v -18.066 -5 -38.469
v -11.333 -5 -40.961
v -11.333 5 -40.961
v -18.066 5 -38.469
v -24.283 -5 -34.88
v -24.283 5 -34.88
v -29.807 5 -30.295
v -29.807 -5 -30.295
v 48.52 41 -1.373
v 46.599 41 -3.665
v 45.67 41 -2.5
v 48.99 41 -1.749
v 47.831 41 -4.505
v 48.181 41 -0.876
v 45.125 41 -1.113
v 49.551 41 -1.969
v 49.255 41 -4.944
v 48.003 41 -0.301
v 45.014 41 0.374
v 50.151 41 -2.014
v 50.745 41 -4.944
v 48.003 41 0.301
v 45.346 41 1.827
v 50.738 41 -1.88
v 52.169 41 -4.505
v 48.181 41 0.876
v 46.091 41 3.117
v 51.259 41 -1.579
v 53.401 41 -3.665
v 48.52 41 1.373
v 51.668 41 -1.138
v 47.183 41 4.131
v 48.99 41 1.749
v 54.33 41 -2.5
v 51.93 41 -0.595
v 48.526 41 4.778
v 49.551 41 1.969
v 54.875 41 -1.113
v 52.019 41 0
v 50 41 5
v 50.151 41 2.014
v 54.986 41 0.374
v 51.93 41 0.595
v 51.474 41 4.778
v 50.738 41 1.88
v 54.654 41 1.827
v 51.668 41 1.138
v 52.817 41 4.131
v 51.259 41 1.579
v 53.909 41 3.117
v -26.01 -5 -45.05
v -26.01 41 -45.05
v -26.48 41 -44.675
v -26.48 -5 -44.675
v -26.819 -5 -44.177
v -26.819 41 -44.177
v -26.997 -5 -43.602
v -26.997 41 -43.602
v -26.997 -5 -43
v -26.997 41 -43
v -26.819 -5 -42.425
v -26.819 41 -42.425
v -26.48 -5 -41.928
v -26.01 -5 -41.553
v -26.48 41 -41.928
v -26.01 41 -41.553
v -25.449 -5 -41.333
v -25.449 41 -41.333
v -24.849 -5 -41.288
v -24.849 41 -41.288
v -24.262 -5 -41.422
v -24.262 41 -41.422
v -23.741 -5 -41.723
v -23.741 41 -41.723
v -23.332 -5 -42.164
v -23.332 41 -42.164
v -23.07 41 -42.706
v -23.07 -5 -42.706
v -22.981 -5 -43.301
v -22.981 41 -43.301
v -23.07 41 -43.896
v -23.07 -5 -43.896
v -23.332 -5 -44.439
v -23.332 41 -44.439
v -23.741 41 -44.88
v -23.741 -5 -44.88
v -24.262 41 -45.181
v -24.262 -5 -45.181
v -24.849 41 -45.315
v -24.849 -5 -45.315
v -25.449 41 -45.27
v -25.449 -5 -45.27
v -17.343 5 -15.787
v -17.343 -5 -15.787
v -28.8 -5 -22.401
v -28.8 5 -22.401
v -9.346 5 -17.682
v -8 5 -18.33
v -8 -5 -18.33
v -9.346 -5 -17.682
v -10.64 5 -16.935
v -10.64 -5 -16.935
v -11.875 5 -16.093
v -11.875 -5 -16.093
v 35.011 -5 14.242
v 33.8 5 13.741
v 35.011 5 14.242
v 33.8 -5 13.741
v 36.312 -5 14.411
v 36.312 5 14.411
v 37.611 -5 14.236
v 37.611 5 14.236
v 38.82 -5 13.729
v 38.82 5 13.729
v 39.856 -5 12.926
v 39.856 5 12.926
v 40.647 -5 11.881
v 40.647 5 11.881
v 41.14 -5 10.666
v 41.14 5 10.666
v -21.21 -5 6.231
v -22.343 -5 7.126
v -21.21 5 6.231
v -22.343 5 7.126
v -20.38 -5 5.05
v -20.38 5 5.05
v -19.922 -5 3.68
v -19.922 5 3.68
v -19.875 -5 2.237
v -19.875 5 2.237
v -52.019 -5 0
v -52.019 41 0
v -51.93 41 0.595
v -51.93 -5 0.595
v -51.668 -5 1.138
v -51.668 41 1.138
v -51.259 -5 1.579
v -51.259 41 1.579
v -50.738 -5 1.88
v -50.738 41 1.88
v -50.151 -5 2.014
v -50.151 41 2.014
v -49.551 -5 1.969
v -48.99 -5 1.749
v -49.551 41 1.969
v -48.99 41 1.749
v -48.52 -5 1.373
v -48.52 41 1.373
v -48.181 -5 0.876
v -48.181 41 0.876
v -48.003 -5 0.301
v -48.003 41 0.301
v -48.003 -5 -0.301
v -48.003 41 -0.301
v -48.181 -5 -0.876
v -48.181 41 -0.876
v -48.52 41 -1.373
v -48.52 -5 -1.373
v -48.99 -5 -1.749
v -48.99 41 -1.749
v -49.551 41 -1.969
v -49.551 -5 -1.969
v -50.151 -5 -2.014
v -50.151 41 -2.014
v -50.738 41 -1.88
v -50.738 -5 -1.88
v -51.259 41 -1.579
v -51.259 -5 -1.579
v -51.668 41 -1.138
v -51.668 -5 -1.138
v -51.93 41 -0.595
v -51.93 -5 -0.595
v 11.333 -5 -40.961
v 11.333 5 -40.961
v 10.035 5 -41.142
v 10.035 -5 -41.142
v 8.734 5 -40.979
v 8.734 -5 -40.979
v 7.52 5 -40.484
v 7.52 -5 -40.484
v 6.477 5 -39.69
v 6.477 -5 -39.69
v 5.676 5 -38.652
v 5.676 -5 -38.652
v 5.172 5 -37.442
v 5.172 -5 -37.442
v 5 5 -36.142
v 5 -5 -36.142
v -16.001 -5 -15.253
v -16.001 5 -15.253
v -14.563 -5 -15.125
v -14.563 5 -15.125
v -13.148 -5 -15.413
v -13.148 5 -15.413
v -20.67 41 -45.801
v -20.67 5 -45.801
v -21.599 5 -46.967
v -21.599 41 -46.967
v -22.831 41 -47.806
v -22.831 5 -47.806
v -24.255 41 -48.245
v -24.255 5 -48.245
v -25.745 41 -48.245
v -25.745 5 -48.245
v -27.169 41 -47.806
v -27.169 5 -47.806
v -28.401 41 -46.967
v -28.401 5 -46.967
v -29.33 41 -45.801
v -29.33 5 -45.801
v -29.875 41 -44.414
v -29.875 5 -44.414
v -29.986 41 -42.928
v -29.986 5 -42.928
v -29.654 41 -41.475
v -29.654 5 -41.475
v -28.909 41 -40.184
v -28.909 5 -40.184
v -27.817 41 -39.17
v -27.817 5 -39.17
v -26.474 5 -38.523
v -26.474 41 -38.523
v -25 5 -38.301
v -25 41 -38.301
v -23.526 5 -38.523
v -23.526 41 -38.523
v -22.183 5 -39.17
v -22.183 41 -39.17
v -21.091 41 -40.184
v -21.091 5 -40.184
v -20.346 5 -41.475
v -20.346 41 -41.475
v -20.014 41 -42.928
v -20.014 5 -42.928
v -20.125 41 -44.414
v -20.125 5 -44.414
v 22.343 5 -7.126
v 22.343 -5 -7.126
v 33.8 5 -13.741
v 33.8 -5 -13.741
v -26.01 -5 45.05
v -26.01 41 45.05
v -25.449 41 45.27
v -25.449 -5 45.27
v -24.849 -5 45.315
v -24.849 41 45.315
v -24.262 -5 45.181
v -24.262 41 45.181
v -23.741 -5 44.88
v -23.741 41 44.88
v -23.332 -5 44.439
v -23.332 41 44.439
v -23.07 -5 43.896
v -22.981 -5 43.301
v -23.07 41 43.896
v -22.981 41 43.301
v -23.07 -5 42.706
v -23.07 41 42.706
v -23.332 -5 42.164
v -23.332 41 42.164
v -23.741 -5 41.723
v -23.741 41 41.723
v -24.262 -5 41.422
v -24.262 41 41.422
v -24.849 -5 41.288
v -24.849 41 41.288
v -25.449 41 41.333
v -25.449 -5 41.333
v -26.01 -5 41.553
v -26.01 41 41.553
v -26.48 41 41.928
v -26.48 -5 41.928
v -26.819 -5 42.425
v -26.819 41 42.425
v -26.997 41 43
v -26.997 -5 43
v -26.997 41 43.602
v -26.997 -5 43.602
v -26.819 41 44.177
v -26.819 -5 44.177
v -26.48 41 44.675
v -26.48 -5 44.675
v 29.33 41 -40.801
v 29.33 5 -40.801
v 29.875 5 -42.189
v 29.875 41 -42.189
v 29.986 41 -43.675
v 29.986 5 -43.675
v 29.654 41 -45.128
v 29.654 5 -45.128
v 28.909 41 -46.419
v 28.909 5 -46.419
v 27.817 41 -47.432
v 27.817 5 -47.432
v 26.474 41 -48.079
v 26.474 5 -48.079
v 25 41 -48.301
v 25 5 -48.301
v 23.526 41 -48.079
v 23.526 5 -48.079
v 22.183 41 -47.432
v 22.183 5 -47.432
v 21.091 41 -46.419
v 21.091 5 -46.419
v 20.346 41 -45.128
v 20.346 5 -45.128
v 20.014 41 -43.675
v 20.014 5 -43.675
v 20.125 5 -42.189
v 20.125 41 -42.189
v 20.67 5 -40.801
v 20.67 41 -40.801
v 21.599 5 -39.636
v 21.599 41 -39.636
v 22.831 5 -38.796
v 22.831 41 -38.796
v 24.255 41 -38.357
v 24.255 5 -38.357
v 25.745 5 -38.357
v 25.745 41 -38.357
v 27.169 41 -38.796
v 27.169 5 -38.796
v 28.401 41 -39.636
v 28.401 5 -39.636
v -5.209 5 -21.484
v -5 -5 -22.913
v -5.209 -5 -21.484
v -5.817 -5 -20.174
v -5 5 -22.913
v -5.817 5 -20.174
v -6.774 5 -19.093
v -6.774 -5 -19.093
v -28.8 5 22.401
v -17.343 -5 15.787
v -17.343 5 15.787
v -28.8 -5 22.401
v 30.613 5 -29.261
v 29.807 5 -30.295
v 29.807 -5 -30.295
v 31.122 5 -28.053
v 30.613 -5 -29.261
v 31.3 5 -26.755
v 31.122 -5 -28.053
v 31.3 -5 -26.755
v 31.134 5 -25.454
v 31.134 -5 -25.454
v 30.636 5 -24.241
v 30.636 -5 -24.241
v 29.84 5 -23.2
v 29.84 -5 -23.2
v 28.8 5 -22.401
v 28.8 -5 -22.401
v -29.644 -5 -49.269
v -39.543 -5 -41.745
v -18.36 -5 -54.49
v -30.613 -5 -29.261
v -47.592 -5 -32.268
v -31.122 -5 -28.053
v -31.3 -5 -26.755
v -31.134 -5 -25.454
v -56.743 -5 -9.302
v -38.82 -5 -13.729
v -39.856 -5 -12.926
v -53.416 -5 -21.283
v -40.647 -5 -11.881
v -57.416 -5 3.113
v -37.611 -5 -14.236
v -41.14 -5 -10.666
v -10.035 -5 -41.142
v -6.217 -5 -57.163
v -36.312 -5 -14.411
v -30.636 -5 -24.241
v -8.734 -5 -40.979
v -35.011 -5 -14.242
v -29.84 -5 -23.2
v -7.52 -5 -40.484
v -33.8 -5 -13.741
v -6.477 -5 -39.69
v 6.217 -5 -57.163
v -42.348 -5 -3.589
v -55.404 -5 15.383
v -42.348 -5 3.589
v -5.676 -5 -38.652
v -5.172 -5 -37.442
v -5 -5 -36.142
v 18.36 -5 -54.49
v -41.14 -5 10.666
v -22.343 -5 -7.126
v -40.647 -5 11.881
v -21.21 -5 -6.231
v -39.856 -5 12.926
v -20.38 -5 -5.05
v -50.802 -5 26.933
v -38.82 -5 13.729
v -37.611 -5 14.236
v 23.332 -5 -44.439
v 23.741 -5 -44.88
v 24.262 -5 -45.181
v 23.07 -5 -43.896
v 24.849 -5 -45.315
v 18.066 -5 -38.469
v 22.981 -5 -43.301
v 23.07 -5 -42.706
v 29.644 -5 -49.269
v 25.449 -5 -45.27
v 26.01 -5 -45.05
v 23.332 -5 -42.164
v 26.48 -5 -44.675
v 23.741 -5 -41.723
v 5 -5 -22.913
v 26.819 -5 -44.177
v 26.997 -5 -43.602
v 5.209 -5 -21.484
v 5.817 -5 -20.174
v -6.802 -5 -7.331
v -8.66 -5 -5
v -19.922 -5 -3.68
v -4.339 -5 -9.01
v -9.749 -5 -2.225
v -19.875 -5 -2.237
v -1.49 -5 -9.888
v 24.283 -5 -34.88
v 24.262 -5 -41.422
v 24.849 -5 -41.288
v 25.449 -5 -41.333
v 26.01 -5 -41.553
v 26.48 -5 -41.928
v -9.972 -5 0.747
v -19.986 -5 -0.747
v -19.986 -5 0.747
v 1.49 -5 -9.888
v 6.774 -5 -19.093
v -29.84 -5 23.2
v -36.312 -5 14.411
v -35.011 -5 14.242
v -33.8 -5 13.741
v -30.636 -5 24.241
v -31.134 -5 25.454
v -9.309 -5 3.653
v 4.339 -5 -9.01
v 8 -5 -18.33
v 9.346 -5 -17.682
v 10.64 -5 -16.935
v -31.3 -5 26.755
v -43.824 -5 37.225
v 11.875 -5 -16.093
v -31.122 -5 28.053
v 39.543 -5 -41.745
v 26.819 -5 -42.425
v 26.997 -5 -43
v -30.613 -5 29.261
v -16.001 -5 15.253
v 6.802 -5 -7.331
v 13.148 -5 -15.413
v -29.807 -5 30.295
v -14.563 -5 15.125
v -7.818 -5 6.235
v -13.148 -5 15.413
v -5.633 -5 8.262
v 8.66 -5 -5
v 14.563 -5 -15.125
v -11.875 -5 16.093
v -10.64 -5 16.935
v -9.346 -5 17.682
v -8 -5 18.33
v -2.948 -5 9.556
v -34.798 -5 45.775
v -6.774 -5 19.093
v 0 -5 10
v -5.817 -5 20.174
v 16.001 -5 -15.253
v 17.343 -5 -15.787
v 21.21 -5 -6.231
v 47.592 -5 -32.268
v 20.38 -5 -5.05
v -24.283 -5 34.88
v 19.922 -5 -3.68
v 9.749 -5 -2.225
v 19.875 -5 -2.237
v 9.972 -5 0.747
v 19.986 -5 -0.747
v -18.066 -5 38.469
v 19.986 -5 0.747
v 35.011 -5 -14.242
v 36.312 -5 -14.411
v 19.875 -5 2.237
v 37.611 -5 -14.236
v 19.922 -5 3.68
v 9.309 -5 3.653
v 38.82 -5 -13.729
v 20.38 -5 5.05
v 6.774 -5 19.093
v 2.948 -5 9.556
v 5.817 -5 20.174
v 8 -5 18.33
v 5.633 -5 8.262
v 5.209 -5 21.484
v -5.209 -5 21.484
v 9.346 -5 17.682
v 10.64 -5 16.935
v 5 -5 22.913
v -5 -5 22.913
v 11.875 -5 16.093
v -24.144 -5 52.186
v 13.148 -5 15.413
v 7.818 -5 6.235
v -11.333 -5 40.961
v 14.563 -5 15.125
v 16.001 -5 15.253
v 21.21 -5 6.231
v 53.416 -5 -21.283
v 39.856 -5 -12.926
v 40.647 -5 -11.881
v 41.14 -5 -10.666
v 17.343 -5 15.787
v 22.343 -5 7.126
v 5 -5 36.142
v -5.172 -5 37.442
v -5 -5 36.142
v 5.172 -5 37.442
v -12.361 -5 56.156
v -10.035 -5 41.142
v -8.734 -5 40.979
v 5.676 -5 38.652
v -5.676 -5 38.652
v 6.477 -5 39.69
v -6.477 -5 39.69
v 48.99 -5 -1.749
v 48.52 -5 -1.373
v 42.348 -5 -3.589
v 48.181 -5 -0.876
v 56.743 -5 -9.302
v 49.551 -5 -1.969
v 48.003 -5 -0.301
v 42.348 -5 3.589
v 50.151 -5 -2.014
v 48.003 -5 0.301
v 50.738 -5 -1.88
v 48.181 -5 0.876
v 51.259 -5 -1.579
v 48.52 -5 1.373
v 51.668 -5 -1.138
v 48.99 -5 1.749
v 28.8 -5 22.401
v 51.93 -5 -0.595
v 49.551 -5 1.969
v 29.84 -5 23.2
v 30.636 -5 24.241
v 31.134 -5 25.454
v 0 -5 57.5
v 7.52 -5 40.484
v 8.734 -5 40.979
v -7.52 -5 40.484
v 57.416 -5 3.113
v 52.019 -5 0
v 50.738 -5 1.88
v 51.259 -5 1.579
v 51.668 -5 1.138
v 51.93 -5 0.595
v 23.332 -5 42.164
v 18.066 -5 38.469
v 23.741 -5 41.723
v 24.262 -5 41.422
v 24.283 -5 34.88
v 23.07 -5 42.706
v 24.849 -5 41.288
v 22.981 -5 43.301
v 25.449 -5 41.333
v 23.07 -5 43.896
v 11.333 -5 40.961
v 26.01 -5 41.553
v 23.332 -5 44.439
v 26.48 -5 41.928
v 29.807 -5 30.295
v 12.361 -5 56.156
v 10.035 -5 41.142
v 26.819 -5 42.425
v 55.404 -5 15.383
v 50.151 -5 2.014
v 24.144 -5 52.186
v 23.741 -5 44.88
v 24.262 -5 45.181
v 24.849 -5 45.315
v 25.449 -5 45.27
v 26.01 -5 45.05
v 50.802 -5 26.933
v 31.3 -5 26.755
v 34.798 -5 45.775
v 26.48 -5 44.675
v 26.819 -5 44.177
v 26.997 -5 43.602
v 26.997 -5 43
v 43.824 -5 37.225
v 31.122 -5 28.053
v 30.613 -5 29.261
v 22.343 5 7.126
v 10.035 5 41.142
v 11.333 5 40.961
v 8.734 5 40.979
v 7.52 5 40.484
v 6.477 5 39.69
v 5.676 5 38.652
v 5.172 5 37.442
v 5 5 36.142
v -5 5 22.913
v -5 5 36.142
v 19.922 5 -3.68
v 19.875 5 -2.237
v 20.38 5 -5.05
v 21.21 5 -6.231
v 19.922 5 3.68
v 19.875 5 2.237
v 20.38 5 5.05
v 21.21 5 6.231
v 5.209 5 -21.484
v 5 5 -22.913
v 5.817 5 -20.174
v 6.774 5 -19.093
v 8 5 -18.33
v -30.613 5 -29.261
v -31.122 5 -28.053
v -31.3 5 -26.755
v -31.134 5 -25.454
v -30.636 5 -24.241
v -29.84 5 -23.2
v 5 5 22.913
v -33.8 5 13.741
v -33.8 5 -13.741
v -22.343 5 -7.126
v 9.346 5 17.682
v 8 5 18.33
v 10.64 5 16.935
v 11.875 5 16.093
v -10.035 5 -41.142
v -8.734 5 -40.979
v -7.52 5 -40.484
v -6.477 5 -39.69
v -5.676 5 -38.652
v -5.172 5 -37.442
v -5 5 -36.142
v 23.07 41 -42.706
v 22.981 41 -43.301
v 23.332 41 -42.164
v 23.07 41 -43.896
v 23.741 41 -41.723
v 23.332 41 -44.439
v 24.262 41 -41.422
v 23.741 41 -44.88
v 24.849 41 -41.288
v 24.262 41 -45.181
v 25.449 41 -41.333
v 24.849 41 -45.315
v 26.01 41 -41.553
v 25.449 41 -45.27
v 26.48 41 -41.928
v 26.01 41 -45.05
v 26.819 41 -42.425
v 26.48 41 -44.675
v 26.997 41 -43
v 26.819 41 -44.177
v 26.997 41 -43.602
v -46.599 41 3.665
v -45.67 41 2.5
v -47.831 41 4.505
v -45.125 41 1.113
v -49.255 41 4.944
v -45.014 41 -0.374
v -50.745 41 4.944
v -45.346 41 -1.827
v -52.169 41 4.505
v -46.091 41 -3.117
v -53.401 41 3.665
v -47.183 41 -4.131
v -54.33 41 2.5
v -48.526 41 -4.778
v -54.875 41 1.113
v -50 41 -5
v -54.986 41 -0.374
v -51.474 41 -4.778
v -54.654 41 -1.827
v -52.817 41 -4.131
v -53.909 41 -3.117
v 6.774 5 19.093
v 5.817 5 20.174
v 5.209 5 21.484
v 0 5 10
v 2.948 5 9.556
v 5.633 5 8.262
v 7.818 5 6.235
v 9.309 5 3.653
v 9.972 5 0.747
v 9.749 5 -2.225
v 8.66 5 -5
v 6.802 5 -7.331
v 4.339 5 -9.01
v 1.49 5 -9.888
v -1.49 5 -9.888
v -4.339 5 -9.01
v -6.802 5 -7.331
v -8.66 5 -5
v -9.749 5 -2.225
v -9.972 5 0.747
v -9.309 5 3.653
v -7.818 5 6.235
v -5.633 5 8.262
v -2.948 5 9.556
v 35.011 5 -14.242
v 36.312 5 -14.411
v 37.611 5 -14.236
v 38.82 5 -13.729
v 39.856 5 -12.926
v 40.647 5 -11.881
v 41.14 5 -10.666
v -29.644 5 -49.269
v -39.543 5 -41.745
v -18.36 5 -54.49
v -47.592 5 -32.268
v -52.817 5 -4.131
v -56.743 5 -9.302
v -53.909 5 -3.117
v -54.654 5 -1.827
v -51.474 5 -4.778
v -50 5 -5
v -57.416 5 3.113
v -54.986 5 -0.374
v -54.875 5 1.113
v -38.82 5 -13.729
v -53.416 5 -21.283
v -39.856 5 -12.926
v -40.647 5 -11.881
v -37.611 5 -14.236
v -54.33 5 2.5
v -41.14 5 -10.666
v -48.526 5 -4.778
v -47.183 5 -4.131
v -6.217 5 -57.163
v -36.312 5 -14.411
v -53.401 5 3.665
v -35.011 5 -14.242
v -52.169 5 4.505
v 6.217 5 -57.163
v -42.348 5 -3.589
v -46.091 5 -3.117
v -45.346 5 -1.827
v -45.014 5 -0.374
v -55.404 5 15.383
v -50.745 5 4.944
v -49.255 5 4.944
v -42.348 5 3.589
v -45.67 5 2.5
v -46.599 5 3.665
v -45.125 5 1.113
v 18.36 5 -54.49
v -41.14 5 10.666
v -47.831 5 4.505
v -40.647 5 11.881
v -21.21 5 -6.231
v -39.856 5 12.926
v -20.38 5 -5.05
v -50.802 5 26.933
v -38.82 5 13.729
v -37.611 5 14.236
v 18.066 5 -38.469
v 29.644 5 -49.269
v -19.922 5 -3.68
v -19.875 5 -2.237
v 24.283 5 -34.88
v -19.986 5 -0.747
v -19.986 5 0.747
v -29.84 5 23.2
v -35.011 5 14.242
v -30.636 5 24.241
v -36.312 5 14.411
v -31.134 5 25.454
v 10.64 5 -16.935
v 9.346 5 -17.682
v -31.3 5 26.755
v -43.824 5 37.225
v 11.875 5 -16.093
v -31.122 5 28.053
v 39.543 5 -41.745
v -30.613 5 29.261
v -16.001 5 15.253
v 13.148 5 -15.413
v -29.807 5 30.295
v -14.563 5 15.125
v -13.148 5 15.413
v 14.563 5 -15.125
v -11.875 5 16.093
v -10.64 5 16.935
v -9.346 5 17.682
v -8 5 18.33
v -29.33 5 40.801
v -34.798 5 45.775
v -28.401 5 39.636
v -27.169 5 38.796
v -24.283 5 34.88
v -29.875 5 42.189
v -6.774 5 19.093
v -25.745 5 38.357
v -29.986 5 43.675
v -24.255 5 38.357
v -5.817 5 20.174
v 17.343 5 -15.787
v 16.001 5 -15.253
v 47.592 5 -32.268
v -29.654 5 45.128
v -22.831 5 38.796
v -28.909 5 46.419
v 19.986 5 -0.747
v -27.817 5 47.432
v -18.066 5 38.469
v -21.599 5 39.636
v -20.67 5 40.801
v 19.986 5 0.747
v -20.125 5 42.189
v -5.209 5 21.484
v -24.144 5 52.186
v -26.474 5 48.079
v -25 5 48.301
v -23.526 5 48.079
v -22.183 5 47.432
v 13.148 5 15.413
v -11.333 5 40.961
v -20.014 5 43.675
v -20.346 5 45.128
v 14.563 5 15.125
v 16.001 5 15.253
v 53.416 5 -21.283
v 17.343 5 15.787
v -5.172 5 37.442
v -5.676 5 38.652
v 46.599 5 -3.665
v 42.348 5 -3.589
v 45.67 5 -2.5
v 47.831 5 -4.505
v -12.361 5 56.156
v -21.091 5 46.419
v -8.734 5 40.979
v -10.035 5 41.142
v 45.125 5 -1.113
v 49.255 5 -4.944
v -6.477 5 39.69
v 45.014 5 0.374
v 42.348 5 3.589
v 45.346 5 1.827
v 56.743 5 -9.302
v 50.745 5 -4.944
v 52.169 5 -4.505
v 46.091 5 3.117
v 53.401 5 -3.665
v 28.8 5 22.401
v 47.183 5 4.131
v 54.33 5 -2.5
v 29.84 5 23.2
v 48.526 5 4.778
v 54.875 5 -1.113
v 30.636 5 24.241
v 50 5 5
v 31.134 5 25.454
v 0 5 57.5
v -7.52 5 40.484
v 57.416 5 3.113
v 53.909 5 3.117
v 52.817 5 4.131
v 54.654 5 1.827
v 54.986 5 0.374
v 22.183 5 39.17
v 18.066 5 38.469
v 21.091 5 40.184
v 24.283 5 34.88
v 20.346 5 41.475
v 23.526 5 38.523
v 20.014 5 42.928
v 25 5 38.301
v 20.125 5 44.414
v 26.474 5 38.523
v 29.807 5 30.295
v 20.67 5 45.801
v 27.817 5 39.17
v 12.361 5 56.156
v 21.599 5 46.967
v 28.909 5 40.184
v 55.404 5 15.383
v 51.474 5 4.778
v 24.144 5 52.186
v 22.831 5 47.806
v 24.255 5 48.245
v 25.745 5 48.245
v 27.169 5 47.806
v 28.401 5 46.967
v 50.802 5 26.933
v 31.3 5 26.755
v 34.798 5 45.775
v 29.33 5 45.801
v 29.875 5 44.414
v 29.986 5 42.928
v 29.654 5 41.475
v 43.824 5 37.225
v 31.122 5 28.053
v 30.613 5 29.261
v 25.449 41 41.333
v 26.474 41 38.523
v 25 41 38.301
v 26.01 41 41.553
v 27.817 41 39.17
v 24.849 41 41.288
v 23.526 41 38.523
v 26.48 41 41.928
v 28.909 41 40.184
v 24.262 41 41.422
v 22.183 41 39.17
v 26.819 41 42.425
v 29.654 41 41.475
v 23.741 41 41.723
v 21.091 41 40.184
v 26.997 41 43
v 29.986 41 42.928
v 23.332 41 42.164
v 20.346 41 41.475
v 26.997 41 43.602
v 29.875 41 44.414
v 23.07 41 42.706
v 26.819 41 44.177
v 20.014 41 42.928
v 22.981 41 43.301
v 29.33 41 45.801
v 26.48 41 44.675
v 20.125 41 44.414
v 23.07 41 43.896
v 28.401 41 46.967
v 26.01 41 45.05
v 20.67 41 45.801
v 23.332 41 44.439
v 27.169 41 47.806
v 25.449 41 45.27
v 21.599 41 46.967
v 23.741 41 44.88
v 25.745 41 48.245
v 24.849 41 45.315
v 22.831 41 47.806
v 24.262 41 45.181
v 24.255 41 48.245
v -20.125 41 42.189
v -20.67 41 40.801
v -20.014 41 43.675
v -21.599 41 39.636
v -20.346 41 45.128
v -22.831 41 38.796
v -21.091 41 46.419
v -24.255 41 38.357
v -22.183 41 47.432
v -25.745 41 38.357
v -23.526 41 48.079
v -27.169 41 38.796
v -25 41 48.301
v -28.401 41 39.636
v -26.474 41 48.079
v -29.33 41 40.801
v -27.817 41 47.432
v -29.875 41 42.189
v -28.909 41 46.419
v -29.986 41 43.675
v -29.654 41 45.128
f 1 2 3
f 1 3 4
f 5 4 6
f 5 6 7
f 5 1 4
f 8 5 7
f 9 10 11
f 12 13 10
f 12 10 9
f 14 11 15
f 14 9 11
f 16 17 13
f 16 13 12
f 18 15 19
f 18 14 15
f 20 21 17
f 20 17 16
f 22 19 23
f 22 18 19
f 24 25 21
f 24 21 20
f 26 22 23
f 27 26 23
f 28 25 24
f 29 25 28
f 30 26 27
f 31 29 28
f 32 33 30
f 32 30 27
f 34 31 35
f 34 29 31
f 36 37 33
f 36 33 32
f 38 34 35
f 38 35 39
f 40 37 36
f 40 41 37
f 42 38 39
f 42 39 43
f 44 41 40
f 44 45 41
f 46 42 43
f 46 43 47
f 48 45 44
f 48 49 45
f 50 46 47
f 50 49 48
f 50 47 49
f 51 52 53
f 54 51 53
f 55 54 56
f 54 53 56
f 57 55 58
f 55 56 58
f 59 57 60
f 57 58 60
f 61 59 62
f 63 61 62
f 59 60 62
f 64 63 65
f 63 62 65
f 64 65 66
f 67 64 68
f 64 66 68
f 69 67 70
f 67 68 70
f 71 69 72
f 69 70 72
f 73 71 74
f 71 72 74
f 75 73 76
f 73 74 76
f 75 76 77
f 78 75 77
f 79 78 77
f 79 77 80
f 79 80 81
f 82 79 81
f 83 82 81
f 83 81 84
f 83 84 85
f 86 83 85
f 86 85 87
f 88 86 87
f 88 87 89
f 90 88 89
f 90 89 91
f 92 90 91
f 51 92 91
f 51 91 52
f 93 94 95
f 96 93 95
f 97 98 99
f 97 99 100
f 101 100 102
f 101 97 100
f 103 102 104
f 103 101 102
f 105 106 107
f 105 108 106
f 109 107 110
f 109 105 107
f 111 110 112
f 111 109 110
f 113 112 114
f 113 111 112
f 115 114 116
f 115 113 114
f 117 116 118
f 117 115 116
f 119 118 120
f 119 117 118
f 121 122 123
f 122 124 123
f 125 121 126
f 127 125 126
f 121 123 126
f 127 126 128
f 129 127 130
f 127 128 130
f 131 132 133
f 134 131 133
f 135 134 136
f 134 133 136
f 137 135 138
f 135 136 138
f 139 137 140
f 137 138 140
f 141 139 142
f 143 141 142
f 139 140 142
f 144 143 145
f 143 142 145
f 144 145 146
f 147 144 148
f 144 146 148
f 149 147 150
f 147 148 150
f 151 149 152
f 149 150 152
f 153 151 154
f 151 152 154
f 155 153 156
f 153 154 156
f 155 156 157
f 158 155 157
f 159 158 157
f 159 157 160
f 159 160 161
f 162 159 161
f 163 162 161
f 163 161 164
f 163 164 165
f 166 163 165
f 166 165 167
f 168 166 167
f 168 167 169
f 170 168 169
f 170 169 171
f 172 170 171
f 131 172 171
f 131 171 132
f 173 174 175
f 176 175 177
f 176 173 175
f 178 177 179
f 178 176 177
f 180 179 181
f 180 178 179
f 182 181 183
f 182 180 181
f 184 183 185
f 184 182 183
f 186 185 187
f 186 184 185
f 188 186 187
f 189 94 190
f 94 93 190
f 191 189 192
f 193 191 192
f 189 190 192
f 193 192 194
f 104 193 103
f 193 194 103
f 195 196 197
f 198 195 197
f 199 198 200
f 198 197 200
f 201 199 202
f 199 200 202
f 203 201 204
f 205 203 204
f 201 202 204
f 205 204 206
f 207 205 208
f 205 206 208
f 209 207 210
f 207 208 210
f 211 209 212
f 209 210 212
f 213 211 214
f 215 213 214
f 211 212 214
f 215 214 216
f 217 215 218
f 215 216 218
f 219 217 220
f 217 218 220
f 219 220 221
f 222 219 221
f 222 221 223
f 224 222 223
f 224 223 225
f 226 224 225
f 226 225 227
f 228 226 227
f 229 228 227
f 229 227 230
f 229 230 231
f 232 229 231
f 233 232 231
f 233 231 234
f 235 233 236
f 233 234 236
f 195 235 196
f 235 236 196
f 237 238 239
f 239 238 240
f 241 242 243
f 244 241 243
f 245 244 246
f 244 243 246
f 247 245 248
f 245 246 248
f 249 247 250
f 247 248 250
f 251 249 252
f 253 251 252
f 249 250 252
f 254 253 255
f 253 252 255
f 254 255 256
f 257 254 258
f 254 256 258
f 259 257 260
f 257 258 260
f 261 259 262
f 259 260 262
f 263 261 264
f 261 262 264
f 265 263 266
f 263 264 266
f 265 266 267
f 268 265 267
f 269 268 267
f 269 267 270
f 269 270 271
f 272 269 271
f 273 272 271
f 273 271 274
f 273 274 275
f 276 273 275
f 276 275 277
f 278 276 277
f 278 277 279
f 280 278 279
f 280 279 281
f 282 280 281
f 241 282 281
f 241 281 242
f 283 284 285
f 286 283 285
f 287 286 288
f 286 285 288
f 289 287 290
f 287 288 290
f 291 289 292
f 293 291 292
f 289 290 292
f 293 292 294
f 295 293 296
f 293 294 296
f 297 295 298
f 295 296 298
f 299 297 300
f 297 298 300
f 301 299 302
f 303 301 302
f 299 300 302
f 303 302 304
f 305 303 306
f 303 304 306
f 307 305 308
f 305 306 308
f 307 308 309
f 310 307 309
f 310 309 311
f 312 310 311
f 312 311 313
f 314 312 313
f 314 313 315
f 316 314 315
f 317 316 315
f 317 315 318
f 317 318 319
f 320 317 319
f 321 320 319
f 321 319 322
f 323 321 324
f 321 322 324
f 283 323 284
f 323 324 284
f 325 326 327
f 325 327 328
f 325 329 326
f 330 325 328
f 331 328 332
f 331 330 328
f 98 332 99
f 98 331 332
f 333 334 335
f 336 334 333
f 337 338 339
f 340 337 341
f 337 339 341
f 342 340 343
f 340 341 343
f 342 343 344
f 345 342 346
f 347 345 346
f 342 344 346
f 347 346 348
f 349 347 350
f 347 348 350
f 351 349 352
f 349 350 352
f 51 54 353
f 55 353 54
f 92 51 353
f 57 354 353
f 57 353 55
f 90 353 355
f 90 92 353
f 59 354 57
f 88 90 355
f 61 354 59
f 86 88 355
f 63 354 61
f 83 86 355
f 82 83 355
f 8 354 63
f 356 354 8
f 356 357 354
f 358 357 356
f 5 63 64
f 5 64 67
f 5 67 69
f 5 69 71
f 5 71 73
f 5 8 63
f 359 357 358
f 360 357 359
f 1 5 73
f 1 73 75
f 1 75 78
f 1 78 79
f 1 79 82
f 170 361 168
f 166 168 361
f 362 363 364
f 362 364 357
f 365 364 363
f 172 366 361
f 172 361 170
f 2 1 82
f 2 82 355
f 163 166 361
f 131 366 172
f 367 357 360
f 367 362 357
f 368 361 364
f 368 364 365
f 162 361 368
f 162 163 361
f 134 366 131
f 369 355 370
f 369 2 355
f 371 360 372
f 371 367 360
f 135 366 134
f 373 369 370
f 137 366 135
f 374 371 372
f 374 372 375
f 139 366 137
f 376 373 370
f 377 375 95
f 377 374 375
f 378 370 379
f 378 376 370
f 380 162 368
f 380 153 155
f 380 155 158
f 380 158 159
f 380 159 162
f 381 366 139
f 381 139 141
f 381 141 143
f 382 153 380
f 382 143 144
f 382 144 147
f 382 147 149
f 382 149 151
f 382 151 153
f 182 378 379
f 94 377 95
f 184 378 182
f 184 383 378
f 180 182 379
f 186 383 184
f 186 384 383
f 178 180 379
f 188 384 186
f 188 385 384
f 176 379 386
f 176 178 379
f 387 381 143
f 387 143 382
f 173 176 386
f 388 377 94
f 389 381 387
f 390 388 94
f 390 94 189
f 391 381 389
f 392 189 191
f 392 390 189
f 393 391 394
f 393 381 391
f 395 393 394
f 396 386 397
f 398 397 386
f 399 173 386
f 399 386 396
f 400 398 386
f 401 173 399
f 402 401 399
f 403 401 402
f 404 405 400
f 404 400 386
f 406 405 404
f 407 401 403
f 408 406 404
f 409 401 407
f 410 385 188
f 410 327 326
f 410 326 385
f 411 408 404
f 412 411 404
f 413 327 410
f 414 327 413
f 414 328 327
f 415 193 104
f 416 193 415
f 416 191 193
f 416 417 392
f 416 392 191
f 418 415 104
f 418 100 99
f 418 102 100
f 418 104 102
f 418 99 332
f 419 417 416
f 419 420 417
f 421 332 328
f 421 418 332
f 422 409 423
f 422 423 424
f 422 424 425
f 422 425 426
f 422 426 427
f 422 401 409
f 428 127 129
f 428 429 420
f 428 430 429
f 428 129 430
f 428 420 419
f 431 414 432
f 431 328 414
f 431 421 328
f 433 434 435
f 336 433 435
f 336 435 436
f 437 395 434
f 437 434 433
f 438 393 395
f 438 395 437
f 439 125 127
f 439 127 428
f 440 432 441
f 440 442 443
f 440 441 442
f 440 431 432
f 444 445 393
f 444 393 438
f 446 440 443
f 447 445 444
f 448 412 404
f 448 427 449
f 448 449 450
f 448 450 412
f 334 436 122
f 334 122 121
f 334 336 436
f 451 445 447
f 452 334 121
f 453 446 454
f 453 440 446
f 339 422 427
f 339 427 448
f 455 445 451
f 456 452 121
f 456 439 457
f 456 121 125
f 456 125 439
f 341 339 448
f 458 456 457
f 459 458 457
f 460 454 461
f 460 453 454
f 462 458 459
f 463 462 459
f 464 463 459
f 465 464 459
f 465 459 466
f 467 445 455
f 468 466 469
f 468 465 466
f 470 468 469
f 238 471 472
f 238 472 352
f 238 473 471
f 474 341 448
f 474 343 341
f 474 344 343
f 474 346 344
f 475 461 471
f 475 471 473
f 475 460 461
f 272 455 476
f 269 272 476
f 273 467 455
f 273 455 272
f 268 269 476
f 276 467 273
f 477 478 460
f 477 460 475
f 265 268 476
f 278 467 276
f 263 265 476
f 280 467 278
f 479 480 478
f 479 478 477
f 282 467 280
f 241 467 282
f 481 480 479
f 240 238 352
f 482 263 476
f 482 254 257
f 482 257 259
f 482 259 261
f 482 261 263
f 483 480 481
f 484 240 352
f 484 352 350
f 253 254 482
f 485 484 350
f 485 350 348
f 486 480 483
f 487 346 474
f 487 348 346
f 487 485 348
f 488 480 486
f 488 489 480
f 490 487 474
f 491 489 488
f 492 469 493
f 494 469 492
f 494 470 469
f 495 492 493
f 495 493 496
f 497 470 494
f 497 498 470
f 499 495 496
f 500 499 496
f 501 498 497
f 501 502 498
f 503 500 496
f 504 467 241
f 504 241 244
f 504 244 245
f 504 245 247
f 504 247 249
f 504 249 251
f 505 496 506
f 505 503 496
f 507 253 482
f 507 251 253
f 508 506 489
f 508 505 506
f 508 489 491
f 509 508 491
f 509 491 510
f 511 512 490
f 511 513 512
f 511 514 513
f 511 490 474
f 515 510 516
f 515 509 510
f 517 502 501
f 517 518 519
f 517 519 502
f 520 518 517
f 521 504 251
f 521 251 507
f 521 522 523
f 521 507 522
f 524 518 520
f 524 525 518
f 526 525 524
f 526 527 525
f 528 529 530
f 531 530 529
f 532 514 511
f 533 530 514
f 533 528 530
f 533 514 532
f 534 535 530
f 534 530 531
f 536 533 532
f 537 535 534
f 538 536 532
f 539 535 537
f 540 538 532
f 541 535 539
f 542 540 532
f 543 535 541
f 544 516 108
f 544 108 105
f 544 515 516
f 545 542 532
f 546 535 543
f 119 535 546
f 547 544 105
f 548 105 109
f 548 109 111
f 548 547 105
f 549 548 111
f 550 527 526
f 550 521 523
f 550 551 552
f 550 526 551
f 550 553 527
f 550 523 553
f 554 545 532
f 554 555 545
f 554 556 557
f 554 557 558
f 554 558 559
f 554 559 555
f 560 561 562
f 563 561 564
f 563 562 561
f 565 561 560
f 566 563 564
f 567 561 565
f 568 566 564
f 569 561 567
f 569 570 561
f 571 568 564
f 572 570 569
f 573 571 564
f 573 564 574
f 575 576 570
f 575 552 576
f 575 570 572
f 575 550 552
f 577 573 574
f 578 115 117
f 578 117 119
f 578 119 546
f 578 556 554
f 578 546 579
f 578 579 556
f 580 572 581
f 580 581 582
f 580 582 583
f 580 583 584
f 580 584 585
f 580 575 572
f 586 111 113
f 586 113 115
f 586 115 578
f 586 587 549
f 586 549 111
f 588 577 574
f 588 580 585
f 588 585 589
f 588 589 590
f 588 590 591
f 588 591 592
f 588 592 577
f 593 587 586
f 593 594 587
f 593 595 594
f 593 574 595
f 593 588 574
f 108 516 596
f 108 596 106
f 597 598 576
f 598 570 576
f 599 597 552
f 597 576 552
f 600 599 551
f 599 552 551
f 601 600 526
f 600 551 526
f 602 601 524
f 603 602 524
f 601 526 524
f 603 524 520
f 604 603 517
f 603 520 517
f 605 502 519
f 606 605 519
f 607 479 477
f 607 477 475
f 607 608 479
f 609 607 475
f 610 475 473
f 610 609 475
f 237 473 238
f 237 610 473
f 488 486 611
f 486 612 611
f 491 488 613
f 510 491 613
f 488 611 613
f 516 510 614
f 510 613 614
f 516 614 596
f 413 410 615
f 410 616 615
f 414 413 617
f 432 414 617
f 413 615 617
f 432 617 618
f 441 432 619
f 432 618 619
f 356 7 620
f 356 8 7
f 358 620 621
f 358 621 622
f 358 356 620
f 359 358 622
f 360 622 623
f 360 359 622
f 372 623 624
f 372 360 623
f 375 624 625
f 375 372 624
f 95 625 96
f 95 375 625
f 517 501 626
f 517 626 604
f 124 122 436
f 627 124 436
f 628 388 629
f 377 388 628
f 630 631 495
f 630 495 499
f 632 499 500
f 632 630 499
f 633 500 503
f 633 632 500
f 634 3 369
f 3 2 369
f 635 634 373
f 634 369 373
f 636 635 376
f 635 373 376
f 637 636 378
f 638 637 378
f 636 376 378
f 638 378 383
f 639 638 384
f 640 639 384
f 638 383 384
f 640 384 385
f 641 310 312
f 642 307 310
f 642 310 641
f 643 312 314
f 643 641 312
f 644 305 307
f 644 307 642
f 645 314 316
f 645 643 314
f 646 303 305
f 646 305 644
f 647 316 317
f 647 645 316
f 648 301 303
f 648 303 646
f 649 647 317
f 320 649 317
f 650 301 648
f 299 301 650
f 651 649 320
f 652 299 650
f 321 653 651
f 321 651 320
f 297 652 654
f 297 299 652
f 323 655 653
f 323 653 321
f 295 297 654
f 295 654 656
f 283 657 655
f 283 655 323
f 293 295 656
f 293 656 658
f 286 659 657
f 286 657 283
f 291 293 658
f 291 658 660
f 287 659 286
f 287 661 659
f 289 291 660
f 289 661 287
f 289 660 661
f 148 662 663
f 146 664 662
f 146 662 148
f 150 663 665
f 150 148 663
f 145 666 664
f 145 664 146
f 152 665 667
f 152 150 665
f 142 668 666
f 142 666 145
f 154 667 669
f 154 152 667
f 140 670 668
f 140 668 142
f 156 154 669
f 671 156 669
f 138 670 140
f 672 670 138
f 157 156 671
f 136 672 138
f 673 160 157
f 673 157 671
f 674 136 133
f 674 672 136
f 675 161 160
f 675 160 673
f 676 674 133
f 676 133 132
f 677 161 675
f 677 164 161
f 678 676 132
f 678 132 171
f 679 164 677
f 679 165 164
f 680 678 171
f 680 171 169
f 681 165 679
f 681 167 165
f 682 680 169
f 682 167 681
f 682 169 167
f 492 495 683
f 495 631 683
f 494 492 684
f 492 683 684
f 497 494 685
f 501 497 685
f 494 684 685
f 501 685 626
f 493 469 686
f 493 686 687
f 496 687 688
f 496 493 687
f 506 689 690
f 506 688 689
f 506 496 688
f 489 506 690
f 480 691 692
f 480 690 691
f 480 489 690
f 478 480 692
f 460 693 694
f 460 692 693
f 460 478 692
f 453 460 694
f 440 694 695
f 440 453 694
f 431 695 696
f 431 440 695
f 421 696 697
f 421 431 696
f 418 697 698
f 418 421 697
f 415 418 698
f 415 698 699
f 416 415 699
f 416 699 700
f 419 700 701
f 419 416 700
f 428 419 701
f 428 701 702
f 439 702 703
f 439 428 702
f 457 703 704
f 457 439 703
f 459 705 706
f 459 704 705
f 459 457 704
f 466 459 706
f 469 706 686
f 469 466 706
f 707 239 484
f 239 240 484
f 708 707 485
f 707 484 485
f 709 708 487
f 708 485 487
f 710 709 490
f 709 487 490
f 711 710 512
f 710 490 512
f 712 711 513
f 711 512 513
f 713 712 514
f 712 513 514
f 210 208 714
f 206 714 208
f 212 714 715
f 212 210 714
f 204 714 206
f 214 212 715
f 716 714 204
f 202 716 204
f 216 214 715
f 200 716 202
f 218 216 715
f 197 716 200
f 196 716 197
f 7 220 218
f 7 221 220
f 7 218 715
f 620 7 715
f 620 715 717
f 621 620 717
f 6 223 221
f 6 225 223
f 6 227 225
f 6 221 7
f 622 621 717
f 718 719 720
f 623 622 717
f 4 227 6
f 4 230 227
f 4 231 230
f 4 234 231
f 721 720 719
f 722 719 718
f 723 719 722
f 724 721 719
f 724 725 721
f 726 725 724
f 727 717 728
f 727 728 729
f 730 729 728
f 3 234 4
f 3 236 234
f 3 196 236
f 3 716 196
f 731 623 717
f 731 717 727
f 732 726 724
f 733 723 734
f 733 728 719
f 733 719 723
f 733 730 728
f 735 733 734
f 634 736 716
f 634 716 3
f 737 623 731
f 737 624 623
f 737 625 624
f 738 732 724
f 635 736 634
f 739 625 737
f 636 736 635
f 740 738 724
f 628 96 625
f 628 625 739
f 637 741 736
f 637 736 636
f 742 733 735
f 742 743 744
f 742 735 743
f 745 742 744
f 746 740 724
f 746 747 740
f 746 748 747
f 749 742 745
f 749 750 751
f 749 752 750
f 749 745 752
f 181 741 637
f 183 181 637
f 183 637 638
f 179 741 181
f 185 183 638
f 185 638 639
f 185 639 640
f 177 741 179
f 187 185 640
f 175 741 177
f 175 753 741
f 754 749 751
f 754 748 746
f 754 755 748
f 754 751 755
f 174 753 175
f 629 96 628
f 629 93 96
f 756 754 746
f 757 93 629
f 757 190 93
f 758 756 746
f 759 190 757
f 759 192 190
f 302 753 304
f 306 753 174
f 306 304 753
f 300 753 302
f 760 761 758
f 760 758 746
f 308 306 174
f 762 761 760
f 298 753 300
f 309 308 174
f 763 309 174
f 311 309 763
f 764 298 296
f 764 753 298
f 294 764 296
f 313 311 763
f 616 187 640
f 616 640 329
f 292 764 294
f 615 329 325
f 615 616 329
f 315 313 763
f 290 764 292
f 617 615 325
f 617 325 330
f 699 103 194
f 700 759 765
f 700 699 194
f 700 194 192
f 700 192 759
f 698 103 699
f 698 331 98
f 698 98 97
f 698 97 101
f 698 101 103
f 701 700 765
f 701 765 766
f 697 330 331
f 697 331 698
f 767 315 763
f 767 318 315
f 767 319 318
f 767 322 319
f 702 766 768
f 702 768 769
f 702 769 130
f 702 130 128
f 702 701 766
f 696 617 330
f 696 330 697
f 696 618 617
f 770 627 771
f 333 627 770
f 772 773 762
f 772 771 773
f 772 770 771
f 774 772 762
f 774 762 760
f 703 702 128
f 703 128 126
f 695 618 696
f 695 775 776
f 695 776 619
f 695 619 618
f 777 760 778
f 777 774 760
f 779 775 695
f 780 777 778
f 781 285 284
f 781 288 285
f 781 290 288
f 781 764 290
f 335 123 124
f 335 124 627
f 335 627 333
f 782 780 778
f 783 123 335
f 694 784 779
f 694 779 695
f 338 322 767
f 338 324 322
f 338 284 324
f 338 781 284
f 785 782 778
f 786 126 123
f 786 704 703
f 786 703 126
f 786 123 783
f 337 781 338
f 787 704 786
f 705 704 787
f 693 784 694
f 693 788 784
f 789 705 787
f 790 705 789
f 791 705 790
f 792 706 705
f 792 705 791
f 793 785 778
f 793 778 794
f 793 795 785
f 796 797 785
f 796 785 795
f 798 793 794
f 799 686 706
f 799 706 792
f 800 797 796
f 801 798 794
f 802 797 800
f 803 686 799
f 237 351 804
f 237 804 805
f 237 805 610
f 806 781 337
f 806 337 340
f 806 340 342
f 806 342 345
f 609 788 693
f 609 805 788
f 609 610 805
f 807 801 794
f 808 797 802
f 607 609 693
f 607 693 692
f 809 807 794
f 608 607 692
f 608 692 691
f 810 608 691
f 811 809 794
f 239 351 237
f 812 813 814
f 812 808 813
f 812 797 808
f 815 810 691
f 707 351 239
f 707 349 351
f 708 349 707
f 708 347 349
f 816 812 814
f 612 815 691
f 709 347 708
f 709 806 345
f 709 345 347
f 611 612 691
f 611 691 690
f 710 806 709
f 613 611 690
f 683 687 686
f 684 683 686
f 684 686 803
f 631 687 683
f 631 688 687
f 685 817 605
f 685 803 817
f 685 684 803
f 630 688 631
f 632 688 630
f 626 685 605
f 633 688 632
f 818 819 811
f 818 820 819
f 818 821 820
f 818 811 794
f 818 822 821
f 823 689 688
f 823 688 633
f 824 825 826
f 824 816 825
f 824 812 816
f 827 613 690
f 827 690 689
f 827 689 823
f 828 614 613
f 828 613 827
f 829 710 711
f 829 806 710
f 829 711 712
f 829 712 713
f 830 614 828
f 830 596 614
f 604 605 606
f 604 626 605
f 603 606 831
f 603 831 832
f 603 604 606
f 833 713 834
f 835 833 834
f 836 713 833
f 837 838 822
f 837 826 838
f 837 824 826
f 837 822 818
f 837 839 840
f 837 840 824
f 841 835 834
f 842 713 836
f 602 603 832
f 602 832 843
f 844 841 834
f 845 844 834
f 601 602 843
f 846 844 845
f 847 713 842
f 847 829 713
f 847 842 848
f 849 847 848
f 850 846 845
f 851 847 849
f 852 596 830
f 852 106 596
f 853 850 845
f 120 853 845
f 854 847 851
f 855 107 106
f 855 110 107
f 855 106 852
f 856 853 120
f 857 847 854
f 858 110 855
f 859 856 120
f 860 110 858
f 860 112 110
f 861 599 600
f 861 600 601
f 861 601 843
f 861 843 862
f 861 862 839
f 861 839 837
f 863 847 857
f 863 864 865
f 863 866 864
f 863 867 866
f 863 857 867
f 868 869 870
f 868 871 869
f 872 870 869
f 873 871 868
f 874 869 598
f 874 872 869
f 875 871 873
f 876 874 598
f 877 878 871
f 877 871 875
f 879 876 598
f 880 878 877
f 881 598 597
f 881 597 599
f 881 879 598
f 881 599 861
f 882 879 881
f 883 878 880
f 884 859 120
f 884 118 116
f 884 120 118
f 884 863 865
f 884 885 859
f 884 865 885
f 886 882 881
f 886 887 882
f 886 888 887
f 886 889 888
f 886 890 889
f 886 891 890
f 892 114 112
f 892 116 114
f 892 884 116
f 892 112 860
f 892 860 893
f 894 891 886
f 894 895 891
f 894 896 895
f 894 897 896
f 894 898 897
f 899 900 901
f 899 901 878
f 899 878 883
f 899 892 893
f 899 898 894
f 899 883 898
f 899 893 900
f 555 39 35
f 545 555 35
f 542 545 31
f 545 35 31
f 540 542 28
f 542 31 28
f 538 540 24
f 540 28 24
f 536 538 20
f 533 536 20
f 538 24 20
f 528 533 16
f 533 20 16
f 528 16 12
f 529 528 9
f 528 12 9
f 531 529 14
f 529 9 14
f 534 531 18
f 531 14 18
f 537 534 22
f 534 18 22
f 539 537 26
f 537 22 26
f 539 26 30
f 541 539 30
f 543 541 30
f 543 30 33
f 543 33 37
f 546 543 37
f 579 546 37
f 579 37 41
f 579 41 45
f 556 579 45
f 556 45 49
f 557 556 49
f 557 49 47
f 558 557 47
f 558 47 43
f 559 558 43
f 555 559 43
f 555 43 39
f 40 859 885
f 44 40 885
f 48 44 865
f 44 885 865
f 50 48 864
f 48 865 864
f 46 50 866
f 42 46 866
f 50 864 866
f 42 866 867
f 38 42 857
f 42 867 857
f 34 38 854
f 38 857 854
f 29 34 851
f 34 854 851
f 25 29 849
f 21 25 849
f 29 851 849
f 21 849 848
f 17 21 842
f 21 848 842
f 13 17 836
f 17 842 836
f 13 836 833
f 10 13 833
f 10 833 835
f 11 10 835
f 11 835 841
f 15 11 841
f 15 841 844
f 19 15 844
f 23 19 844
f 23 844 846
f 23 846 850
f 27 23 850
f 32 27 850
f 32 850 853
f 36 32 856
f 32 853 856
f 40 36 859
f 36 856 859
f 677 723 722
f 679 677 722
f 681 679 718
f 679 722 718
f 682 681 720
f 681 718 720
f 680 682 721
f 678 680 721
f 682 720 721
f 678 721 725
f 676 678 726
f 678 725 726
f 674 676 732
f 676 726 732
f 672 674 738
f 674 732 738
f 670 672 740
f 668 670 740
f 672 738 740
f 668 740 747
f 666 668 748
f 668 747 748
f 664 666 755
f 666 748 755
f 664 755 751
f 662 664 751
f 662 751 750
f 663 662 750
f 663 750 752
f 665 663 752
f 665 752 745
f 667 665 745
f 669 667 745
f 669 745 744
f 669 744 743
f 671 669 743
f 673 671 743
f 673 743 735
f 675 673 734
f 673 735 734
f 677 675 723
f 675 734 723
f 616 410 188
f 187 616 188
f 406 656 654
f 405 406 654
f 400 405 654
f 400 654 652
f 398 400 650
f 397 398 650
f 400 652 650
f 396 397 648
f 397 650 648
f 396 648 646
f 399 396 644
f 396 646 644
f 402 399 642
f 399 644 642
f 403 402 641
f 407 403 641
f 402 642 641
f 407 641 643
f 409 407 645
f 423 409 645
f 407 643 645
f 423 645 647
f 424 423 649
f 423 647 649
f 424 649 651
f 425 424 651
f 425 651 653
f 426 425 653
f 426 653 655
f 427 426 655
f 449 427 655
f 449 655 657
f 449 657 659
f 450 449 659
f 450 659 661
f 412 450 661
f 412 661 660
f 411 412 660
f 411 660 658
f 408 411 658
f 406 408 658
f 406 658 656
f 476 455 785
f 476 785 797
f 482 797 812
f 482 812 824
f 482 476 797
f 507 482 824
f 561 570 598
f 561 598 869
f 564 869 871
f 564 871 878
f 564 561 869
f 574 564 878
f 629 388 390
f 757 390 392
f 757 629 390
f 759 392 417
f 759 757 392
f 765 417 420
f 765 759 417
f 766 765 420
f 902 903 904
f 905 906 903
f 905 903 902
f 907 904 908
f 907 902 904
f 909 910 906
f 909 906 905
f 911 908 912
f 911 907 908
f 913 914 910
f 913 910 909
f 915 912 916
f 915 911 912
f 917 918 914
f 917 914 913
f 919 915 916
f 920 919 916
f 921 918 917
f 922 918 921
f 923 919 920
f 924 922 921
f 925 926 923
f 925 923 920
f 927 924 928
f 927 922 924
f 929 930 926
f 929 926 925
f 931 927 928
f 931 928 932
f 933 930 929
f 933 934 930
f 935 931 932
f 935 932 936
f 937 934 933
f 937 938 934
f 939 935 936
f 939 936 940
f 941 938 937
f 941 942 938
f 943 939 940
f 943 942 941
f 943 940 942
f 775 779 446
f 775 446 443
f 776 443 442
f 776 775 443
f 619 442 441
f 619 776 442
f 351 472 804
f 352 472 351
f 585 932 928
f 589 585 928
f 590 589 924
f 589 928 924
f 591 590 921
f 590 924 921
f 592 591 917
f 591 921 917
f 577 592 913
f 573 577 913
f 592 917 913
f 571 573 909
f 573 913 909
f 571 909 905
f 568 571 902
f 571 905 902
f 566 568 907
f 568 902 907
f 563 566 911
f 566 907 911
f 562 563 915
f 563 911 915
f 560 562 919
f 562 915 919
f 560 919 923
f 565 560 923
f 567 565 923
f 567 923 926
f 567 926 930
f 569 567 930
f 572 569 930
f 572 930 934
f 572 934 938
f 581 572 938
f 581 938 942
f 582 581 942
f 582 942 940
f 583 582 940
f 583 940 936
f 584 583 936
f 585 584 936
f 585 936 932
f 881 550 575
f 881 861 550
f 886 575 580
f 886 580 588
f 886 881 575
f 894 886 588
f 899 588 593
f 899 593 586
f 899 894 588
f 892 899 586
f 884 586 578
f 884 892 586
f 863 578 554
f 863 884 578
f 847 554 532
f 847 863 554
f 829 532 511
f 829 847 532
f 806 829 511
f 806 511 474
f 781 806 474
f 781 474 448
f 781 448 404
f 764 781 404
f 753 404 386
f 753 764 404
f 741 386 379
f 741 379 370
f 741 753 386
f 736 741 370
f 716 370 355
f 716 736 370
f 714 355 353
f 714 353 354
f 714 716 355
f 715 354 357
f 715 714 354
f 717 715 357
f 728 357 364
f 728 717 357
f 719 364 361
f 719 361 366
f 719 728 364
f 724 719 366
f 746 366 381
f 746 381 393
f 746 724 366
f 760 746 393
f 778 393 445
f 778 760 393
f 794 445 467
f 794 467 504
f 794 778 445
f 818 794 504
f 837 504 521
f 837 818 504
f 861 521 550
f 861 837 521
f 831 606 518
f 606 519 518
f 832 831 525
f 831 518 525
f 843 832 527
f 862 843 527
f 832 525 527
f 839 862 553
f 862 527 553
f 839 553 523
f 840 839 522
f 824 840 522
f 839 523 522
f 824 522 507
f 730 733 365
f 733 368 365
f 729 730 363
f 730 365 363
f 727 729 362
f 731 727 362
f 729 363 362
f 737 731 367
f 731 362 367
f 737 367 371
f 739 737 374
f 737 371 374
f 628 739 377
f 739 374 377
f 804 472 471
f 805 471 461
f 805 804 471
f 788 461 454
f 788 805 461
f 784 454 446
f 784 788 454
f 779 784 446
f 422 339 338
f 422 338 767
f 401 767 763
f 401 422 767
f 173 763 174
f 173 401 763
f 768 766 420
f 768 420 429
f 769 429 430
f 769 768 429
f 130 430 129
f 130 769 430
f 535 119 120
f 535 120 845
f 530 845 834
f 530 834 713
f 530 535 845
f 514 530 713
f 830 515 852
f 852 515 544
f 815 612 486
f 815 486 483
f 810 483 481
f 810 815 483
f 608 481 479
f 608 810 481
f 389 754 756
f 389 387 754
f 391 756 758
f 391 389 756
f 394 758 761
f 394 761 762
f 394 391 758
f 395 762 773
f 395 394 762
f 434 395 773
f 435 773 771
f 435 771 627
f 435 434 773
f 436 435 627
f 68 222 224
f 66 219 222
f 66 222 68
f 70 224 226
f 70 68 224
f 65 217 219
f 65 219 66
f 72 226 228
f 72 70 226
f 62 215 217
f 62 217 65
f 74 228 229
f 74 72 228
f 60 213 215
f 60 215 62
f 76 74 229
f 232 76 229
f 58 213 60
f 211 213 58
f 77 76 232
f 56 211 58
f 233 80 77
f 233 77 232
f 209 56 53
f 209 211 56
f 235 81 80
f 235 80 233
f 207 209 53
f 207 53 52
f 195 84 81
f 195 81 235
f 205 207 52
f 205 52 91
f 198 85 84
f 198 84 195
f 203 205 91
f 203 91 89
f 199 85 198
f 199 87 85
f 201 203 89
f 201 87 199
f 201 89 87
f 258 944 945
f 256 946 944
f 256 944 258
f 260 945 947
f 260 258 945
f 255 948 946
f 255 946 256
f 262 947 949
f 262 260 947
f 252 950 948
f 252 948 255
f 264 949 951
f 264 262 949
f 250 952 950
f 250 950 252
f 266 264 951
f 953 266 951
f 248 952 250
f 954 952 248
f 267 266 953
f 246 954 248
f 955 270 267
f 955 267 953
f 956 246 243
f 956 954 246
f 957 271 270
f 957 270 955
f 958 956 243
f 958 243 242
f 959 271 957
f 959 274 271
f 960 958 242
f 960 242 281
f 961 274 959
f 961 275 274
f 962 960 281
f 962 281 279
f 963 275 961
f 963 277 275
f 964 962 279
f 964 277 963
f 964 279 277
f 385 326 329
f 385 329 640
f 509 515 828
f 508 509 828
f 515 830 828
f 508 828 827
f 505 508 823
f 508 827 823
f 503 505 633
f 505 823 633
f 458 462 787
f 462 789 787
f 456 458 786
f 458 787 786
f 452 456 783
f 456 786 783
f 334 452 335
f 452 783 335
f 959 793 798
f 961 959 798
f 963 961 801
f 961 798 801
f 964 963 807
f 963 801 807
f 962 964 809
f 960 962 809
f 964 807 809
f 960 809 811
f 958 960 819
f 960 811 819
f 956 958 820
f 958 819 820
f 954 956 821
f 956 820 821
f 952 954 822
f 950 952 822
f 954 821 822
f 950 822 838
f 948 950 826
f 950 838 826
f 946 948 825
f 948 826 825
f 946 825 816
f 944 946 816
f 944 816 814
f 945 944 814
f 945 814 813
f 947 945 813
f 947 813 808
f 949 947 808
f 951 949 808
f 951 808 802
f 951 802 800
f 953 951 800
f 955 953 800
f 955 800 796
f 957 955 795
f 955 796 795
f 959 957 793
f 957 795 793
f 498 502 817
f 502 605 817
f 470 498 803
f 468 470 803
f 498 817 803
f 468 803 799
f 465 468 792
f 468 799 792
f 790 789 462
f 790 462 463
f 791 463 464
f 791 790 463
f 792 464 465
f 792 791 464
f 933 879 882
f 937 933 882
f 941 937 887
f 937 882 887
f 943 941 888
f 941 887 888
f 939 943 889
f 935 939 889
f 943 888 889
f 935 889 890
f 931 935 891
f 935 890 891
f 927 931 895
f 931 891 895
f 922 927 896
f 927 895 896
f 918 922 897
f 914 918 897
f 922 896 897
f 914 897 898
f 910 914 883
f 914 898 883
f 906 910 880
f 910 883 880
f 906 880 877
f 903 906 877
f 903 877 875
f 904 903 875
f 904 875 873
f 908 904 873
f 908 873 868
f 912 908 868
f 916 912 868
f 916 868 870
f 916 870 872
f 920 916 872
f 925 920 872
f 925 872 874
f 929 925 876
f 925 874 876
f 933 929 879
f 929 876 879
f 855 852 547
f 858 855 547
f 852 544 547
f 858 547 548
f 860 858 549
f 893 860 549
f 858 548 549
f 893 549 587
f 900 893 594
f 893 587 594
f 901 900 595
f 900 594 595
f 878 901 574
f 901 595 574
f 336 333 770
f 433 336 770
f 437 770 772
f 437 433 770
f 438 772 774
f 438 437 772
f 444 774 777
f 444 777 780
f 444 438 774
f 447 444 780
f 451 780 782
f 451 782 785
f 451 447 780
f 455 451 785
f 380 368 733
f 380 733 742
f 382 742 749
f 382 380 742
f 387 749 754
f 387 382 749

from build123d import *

# Parameters (mm, degrees)
SKETCH1_R                  = 20
SKETCH1_R_2                = 10
BOSS_EXTRUDE1_DEPTH        = 5
SKETCH1_R_3                = 57.5
SKETCH1_R_4                = 42.5
BOSS_EXTRUDE1_2_DEPTH      = 5
SKETCH2_W                  = 10
SKETCH2_H                  = 32.5
BOSS_EXTRUDE2_DEPTH        = 10
SKETCH4_R                  = 5
BOSS_EXTRUDE3_DEPTH        = 36
TAP_DRILL_FOR_10_32_TAP1_D = 4.0386
FILLET1_R                  = 5
CIRPATTERN1_COUNT          = 6
FILLET1_OF_CIRPATTERN1_R   = 5


with BuildPart() as part:
    # Sketch1 → Boss-Extrude1 (new, symmetric)
    with BuildSketch(Plane(origin=(0, 0, 0), x_dir=(1, 0, 0), z_dir=(0, 1, 0))):
        with Locations(Location((0, 0, 0), (0, 0, 270))):
            Circle(SKETCH1_R)
        with Locations(Location((0, 0, 0), (0, 0, 270))):
            Circle(SKETCH1_R_2, mode=Mode.SUBTRACT)
    extrude(amount=BOSS_EXTRUDE1_DEPTH, both=True)



with BuildPart() as body_2:
    # Sketch1 → Boss-Extrude1 2 (new, symmetric)
    with BuildSketch(Plane(origin=(0, 0, 0), x_dir=(1, 0, 0), z_dir=(0, 1, 0))):
        with Locations(Location((0, 0, 0), (0, 0, 270))):
            Circle(SKETCH1_R_3)
        with Locations(Location((0, 0, 0), (0, 0, 270))):
            Circle(SKETCH1_R_4, mode=Mode.SUBTRACT)
    extrude(amount=BOSS_EXTRUDE1_2_DEPTH, both=True)


with BuildPart() as part_1:
    add(part.part)

    add(body_2.part)  # Boss-Extrude2 merges body 2
    # Sketch2 → Boss-Extrude2 (add)
    with BuildSketch(Plane.XZ.offset(5)):
        with Locations((0, 26.25)):
            Rectangle(SKETCH2_W, SKETCH2_H)
    boss_extrude2 = extrude(amount=-BOSS_EXTRUDE2_DEPTH)

    # Sketch4 → Boss-Extrude3 (add)
    with BuildSketch(Plane(origin=(0, 5, 0), x_dir=(1, 0, 0), z_dir=(0, 1, 0))):
        with Locations(Location((50, 0, 0), (0, 0, 270))):
            Circle(SKETCH4_R)
    boss_extrude3 = extrude(amount=BOSS_EXTRUDE3_DEPTH)

    # Tap Drill for #10-32 Tap1 (through all)
    with Locations(Plane(origin=(0, -5, 0), x_dir=(-1, 0, 0), z_dir=(0, -1, 0))):
        with Locations((-50, 0)):
            tap_drill_for_10_32_tap1 = Hole(TAP_DRILL_FOR_10_32_TAP1_D / 2)

    # Fillet1
    fillet1_edges = [part_1.edges().sort_by_distance(p)[0] for p in [
        (5, 0, 19.364916731),
        (-5, 0, 19.364916731),
        (5, 0, 42.20485754),
        (-5, 0, 42.20485754),
    ]]
    fillet(fillet1_edges, radius=FILLET1_R)

    # CirPattern1: Boss-Extrude2, Boss-Extrude3, Tap Drill for #10-32 Tap1 ×6 about axis
    cirpattern1_axis = Axis((0, 0, 0), (0, 1, 0))
    add([boss_extrude2.rotate(cirpattern1_axis, i * 360 / CIRPATTERN1_COUNT) for i in range(1, CIRPATTERN1_COUNT)])
    add([boss_extrude3.rotate(cirpattern1_axis, i * 360 / CIRPATTERN1_COUNT) for i in range(1, CIRPATTERN1_COUNT)])
    add([tap_drill_for_10_32_tap1.rotate(cirpattern1_axis, i * 360 / CIRPATTERN1_COUNT) for i in range(1, CIRPATTERN1_COUNT)], mode=Mode.SUBTRACT)

    # Fillet1 of CirPattern1
    fillet1_of_cirpattern1_edges = [part_1.edges().sort_by_distance(p)[0] for p in [
        (19.270509831, 0, 5.352331347),
        (14.270509831, 0, 14.012585384),
        (39.050478793, 0, 16.772301751),
        (34.050478793, 0, 25.432555789),
        (14.270509831, 0, -14.012585384),
        (19.270509831, 0, -5.352331347),
        (34.050478793, 0, -25.432555789),
        (39.050478793, 0, -16.772301751),
        (-5, 0, -19.364916731),
        (5, 0, -19.364916731),
        (-5, 0, -42.20485754),
        (5, 0, -42.20485754),
        (-19.270509831, 0, -5.352331347),
        (-14.270509831, 0, -14.012585384),
        (-39.050478793, 0, -16.772301751),
        (-34.050478793, 0, -25.432555789),
        (-14.270509831, 0, 14.012585384),
        (-19.270509831, 0, 5.352331347),
        (-34.050478793, 0, 25.432555789),
        (-39.050478793, 0, 16.772301751),
    ]]
    fillet(fillet1_of_cirpattern1_edges, radius=FILLET1_OF_CIRPATTERN1_R)


solid = part_1.part
